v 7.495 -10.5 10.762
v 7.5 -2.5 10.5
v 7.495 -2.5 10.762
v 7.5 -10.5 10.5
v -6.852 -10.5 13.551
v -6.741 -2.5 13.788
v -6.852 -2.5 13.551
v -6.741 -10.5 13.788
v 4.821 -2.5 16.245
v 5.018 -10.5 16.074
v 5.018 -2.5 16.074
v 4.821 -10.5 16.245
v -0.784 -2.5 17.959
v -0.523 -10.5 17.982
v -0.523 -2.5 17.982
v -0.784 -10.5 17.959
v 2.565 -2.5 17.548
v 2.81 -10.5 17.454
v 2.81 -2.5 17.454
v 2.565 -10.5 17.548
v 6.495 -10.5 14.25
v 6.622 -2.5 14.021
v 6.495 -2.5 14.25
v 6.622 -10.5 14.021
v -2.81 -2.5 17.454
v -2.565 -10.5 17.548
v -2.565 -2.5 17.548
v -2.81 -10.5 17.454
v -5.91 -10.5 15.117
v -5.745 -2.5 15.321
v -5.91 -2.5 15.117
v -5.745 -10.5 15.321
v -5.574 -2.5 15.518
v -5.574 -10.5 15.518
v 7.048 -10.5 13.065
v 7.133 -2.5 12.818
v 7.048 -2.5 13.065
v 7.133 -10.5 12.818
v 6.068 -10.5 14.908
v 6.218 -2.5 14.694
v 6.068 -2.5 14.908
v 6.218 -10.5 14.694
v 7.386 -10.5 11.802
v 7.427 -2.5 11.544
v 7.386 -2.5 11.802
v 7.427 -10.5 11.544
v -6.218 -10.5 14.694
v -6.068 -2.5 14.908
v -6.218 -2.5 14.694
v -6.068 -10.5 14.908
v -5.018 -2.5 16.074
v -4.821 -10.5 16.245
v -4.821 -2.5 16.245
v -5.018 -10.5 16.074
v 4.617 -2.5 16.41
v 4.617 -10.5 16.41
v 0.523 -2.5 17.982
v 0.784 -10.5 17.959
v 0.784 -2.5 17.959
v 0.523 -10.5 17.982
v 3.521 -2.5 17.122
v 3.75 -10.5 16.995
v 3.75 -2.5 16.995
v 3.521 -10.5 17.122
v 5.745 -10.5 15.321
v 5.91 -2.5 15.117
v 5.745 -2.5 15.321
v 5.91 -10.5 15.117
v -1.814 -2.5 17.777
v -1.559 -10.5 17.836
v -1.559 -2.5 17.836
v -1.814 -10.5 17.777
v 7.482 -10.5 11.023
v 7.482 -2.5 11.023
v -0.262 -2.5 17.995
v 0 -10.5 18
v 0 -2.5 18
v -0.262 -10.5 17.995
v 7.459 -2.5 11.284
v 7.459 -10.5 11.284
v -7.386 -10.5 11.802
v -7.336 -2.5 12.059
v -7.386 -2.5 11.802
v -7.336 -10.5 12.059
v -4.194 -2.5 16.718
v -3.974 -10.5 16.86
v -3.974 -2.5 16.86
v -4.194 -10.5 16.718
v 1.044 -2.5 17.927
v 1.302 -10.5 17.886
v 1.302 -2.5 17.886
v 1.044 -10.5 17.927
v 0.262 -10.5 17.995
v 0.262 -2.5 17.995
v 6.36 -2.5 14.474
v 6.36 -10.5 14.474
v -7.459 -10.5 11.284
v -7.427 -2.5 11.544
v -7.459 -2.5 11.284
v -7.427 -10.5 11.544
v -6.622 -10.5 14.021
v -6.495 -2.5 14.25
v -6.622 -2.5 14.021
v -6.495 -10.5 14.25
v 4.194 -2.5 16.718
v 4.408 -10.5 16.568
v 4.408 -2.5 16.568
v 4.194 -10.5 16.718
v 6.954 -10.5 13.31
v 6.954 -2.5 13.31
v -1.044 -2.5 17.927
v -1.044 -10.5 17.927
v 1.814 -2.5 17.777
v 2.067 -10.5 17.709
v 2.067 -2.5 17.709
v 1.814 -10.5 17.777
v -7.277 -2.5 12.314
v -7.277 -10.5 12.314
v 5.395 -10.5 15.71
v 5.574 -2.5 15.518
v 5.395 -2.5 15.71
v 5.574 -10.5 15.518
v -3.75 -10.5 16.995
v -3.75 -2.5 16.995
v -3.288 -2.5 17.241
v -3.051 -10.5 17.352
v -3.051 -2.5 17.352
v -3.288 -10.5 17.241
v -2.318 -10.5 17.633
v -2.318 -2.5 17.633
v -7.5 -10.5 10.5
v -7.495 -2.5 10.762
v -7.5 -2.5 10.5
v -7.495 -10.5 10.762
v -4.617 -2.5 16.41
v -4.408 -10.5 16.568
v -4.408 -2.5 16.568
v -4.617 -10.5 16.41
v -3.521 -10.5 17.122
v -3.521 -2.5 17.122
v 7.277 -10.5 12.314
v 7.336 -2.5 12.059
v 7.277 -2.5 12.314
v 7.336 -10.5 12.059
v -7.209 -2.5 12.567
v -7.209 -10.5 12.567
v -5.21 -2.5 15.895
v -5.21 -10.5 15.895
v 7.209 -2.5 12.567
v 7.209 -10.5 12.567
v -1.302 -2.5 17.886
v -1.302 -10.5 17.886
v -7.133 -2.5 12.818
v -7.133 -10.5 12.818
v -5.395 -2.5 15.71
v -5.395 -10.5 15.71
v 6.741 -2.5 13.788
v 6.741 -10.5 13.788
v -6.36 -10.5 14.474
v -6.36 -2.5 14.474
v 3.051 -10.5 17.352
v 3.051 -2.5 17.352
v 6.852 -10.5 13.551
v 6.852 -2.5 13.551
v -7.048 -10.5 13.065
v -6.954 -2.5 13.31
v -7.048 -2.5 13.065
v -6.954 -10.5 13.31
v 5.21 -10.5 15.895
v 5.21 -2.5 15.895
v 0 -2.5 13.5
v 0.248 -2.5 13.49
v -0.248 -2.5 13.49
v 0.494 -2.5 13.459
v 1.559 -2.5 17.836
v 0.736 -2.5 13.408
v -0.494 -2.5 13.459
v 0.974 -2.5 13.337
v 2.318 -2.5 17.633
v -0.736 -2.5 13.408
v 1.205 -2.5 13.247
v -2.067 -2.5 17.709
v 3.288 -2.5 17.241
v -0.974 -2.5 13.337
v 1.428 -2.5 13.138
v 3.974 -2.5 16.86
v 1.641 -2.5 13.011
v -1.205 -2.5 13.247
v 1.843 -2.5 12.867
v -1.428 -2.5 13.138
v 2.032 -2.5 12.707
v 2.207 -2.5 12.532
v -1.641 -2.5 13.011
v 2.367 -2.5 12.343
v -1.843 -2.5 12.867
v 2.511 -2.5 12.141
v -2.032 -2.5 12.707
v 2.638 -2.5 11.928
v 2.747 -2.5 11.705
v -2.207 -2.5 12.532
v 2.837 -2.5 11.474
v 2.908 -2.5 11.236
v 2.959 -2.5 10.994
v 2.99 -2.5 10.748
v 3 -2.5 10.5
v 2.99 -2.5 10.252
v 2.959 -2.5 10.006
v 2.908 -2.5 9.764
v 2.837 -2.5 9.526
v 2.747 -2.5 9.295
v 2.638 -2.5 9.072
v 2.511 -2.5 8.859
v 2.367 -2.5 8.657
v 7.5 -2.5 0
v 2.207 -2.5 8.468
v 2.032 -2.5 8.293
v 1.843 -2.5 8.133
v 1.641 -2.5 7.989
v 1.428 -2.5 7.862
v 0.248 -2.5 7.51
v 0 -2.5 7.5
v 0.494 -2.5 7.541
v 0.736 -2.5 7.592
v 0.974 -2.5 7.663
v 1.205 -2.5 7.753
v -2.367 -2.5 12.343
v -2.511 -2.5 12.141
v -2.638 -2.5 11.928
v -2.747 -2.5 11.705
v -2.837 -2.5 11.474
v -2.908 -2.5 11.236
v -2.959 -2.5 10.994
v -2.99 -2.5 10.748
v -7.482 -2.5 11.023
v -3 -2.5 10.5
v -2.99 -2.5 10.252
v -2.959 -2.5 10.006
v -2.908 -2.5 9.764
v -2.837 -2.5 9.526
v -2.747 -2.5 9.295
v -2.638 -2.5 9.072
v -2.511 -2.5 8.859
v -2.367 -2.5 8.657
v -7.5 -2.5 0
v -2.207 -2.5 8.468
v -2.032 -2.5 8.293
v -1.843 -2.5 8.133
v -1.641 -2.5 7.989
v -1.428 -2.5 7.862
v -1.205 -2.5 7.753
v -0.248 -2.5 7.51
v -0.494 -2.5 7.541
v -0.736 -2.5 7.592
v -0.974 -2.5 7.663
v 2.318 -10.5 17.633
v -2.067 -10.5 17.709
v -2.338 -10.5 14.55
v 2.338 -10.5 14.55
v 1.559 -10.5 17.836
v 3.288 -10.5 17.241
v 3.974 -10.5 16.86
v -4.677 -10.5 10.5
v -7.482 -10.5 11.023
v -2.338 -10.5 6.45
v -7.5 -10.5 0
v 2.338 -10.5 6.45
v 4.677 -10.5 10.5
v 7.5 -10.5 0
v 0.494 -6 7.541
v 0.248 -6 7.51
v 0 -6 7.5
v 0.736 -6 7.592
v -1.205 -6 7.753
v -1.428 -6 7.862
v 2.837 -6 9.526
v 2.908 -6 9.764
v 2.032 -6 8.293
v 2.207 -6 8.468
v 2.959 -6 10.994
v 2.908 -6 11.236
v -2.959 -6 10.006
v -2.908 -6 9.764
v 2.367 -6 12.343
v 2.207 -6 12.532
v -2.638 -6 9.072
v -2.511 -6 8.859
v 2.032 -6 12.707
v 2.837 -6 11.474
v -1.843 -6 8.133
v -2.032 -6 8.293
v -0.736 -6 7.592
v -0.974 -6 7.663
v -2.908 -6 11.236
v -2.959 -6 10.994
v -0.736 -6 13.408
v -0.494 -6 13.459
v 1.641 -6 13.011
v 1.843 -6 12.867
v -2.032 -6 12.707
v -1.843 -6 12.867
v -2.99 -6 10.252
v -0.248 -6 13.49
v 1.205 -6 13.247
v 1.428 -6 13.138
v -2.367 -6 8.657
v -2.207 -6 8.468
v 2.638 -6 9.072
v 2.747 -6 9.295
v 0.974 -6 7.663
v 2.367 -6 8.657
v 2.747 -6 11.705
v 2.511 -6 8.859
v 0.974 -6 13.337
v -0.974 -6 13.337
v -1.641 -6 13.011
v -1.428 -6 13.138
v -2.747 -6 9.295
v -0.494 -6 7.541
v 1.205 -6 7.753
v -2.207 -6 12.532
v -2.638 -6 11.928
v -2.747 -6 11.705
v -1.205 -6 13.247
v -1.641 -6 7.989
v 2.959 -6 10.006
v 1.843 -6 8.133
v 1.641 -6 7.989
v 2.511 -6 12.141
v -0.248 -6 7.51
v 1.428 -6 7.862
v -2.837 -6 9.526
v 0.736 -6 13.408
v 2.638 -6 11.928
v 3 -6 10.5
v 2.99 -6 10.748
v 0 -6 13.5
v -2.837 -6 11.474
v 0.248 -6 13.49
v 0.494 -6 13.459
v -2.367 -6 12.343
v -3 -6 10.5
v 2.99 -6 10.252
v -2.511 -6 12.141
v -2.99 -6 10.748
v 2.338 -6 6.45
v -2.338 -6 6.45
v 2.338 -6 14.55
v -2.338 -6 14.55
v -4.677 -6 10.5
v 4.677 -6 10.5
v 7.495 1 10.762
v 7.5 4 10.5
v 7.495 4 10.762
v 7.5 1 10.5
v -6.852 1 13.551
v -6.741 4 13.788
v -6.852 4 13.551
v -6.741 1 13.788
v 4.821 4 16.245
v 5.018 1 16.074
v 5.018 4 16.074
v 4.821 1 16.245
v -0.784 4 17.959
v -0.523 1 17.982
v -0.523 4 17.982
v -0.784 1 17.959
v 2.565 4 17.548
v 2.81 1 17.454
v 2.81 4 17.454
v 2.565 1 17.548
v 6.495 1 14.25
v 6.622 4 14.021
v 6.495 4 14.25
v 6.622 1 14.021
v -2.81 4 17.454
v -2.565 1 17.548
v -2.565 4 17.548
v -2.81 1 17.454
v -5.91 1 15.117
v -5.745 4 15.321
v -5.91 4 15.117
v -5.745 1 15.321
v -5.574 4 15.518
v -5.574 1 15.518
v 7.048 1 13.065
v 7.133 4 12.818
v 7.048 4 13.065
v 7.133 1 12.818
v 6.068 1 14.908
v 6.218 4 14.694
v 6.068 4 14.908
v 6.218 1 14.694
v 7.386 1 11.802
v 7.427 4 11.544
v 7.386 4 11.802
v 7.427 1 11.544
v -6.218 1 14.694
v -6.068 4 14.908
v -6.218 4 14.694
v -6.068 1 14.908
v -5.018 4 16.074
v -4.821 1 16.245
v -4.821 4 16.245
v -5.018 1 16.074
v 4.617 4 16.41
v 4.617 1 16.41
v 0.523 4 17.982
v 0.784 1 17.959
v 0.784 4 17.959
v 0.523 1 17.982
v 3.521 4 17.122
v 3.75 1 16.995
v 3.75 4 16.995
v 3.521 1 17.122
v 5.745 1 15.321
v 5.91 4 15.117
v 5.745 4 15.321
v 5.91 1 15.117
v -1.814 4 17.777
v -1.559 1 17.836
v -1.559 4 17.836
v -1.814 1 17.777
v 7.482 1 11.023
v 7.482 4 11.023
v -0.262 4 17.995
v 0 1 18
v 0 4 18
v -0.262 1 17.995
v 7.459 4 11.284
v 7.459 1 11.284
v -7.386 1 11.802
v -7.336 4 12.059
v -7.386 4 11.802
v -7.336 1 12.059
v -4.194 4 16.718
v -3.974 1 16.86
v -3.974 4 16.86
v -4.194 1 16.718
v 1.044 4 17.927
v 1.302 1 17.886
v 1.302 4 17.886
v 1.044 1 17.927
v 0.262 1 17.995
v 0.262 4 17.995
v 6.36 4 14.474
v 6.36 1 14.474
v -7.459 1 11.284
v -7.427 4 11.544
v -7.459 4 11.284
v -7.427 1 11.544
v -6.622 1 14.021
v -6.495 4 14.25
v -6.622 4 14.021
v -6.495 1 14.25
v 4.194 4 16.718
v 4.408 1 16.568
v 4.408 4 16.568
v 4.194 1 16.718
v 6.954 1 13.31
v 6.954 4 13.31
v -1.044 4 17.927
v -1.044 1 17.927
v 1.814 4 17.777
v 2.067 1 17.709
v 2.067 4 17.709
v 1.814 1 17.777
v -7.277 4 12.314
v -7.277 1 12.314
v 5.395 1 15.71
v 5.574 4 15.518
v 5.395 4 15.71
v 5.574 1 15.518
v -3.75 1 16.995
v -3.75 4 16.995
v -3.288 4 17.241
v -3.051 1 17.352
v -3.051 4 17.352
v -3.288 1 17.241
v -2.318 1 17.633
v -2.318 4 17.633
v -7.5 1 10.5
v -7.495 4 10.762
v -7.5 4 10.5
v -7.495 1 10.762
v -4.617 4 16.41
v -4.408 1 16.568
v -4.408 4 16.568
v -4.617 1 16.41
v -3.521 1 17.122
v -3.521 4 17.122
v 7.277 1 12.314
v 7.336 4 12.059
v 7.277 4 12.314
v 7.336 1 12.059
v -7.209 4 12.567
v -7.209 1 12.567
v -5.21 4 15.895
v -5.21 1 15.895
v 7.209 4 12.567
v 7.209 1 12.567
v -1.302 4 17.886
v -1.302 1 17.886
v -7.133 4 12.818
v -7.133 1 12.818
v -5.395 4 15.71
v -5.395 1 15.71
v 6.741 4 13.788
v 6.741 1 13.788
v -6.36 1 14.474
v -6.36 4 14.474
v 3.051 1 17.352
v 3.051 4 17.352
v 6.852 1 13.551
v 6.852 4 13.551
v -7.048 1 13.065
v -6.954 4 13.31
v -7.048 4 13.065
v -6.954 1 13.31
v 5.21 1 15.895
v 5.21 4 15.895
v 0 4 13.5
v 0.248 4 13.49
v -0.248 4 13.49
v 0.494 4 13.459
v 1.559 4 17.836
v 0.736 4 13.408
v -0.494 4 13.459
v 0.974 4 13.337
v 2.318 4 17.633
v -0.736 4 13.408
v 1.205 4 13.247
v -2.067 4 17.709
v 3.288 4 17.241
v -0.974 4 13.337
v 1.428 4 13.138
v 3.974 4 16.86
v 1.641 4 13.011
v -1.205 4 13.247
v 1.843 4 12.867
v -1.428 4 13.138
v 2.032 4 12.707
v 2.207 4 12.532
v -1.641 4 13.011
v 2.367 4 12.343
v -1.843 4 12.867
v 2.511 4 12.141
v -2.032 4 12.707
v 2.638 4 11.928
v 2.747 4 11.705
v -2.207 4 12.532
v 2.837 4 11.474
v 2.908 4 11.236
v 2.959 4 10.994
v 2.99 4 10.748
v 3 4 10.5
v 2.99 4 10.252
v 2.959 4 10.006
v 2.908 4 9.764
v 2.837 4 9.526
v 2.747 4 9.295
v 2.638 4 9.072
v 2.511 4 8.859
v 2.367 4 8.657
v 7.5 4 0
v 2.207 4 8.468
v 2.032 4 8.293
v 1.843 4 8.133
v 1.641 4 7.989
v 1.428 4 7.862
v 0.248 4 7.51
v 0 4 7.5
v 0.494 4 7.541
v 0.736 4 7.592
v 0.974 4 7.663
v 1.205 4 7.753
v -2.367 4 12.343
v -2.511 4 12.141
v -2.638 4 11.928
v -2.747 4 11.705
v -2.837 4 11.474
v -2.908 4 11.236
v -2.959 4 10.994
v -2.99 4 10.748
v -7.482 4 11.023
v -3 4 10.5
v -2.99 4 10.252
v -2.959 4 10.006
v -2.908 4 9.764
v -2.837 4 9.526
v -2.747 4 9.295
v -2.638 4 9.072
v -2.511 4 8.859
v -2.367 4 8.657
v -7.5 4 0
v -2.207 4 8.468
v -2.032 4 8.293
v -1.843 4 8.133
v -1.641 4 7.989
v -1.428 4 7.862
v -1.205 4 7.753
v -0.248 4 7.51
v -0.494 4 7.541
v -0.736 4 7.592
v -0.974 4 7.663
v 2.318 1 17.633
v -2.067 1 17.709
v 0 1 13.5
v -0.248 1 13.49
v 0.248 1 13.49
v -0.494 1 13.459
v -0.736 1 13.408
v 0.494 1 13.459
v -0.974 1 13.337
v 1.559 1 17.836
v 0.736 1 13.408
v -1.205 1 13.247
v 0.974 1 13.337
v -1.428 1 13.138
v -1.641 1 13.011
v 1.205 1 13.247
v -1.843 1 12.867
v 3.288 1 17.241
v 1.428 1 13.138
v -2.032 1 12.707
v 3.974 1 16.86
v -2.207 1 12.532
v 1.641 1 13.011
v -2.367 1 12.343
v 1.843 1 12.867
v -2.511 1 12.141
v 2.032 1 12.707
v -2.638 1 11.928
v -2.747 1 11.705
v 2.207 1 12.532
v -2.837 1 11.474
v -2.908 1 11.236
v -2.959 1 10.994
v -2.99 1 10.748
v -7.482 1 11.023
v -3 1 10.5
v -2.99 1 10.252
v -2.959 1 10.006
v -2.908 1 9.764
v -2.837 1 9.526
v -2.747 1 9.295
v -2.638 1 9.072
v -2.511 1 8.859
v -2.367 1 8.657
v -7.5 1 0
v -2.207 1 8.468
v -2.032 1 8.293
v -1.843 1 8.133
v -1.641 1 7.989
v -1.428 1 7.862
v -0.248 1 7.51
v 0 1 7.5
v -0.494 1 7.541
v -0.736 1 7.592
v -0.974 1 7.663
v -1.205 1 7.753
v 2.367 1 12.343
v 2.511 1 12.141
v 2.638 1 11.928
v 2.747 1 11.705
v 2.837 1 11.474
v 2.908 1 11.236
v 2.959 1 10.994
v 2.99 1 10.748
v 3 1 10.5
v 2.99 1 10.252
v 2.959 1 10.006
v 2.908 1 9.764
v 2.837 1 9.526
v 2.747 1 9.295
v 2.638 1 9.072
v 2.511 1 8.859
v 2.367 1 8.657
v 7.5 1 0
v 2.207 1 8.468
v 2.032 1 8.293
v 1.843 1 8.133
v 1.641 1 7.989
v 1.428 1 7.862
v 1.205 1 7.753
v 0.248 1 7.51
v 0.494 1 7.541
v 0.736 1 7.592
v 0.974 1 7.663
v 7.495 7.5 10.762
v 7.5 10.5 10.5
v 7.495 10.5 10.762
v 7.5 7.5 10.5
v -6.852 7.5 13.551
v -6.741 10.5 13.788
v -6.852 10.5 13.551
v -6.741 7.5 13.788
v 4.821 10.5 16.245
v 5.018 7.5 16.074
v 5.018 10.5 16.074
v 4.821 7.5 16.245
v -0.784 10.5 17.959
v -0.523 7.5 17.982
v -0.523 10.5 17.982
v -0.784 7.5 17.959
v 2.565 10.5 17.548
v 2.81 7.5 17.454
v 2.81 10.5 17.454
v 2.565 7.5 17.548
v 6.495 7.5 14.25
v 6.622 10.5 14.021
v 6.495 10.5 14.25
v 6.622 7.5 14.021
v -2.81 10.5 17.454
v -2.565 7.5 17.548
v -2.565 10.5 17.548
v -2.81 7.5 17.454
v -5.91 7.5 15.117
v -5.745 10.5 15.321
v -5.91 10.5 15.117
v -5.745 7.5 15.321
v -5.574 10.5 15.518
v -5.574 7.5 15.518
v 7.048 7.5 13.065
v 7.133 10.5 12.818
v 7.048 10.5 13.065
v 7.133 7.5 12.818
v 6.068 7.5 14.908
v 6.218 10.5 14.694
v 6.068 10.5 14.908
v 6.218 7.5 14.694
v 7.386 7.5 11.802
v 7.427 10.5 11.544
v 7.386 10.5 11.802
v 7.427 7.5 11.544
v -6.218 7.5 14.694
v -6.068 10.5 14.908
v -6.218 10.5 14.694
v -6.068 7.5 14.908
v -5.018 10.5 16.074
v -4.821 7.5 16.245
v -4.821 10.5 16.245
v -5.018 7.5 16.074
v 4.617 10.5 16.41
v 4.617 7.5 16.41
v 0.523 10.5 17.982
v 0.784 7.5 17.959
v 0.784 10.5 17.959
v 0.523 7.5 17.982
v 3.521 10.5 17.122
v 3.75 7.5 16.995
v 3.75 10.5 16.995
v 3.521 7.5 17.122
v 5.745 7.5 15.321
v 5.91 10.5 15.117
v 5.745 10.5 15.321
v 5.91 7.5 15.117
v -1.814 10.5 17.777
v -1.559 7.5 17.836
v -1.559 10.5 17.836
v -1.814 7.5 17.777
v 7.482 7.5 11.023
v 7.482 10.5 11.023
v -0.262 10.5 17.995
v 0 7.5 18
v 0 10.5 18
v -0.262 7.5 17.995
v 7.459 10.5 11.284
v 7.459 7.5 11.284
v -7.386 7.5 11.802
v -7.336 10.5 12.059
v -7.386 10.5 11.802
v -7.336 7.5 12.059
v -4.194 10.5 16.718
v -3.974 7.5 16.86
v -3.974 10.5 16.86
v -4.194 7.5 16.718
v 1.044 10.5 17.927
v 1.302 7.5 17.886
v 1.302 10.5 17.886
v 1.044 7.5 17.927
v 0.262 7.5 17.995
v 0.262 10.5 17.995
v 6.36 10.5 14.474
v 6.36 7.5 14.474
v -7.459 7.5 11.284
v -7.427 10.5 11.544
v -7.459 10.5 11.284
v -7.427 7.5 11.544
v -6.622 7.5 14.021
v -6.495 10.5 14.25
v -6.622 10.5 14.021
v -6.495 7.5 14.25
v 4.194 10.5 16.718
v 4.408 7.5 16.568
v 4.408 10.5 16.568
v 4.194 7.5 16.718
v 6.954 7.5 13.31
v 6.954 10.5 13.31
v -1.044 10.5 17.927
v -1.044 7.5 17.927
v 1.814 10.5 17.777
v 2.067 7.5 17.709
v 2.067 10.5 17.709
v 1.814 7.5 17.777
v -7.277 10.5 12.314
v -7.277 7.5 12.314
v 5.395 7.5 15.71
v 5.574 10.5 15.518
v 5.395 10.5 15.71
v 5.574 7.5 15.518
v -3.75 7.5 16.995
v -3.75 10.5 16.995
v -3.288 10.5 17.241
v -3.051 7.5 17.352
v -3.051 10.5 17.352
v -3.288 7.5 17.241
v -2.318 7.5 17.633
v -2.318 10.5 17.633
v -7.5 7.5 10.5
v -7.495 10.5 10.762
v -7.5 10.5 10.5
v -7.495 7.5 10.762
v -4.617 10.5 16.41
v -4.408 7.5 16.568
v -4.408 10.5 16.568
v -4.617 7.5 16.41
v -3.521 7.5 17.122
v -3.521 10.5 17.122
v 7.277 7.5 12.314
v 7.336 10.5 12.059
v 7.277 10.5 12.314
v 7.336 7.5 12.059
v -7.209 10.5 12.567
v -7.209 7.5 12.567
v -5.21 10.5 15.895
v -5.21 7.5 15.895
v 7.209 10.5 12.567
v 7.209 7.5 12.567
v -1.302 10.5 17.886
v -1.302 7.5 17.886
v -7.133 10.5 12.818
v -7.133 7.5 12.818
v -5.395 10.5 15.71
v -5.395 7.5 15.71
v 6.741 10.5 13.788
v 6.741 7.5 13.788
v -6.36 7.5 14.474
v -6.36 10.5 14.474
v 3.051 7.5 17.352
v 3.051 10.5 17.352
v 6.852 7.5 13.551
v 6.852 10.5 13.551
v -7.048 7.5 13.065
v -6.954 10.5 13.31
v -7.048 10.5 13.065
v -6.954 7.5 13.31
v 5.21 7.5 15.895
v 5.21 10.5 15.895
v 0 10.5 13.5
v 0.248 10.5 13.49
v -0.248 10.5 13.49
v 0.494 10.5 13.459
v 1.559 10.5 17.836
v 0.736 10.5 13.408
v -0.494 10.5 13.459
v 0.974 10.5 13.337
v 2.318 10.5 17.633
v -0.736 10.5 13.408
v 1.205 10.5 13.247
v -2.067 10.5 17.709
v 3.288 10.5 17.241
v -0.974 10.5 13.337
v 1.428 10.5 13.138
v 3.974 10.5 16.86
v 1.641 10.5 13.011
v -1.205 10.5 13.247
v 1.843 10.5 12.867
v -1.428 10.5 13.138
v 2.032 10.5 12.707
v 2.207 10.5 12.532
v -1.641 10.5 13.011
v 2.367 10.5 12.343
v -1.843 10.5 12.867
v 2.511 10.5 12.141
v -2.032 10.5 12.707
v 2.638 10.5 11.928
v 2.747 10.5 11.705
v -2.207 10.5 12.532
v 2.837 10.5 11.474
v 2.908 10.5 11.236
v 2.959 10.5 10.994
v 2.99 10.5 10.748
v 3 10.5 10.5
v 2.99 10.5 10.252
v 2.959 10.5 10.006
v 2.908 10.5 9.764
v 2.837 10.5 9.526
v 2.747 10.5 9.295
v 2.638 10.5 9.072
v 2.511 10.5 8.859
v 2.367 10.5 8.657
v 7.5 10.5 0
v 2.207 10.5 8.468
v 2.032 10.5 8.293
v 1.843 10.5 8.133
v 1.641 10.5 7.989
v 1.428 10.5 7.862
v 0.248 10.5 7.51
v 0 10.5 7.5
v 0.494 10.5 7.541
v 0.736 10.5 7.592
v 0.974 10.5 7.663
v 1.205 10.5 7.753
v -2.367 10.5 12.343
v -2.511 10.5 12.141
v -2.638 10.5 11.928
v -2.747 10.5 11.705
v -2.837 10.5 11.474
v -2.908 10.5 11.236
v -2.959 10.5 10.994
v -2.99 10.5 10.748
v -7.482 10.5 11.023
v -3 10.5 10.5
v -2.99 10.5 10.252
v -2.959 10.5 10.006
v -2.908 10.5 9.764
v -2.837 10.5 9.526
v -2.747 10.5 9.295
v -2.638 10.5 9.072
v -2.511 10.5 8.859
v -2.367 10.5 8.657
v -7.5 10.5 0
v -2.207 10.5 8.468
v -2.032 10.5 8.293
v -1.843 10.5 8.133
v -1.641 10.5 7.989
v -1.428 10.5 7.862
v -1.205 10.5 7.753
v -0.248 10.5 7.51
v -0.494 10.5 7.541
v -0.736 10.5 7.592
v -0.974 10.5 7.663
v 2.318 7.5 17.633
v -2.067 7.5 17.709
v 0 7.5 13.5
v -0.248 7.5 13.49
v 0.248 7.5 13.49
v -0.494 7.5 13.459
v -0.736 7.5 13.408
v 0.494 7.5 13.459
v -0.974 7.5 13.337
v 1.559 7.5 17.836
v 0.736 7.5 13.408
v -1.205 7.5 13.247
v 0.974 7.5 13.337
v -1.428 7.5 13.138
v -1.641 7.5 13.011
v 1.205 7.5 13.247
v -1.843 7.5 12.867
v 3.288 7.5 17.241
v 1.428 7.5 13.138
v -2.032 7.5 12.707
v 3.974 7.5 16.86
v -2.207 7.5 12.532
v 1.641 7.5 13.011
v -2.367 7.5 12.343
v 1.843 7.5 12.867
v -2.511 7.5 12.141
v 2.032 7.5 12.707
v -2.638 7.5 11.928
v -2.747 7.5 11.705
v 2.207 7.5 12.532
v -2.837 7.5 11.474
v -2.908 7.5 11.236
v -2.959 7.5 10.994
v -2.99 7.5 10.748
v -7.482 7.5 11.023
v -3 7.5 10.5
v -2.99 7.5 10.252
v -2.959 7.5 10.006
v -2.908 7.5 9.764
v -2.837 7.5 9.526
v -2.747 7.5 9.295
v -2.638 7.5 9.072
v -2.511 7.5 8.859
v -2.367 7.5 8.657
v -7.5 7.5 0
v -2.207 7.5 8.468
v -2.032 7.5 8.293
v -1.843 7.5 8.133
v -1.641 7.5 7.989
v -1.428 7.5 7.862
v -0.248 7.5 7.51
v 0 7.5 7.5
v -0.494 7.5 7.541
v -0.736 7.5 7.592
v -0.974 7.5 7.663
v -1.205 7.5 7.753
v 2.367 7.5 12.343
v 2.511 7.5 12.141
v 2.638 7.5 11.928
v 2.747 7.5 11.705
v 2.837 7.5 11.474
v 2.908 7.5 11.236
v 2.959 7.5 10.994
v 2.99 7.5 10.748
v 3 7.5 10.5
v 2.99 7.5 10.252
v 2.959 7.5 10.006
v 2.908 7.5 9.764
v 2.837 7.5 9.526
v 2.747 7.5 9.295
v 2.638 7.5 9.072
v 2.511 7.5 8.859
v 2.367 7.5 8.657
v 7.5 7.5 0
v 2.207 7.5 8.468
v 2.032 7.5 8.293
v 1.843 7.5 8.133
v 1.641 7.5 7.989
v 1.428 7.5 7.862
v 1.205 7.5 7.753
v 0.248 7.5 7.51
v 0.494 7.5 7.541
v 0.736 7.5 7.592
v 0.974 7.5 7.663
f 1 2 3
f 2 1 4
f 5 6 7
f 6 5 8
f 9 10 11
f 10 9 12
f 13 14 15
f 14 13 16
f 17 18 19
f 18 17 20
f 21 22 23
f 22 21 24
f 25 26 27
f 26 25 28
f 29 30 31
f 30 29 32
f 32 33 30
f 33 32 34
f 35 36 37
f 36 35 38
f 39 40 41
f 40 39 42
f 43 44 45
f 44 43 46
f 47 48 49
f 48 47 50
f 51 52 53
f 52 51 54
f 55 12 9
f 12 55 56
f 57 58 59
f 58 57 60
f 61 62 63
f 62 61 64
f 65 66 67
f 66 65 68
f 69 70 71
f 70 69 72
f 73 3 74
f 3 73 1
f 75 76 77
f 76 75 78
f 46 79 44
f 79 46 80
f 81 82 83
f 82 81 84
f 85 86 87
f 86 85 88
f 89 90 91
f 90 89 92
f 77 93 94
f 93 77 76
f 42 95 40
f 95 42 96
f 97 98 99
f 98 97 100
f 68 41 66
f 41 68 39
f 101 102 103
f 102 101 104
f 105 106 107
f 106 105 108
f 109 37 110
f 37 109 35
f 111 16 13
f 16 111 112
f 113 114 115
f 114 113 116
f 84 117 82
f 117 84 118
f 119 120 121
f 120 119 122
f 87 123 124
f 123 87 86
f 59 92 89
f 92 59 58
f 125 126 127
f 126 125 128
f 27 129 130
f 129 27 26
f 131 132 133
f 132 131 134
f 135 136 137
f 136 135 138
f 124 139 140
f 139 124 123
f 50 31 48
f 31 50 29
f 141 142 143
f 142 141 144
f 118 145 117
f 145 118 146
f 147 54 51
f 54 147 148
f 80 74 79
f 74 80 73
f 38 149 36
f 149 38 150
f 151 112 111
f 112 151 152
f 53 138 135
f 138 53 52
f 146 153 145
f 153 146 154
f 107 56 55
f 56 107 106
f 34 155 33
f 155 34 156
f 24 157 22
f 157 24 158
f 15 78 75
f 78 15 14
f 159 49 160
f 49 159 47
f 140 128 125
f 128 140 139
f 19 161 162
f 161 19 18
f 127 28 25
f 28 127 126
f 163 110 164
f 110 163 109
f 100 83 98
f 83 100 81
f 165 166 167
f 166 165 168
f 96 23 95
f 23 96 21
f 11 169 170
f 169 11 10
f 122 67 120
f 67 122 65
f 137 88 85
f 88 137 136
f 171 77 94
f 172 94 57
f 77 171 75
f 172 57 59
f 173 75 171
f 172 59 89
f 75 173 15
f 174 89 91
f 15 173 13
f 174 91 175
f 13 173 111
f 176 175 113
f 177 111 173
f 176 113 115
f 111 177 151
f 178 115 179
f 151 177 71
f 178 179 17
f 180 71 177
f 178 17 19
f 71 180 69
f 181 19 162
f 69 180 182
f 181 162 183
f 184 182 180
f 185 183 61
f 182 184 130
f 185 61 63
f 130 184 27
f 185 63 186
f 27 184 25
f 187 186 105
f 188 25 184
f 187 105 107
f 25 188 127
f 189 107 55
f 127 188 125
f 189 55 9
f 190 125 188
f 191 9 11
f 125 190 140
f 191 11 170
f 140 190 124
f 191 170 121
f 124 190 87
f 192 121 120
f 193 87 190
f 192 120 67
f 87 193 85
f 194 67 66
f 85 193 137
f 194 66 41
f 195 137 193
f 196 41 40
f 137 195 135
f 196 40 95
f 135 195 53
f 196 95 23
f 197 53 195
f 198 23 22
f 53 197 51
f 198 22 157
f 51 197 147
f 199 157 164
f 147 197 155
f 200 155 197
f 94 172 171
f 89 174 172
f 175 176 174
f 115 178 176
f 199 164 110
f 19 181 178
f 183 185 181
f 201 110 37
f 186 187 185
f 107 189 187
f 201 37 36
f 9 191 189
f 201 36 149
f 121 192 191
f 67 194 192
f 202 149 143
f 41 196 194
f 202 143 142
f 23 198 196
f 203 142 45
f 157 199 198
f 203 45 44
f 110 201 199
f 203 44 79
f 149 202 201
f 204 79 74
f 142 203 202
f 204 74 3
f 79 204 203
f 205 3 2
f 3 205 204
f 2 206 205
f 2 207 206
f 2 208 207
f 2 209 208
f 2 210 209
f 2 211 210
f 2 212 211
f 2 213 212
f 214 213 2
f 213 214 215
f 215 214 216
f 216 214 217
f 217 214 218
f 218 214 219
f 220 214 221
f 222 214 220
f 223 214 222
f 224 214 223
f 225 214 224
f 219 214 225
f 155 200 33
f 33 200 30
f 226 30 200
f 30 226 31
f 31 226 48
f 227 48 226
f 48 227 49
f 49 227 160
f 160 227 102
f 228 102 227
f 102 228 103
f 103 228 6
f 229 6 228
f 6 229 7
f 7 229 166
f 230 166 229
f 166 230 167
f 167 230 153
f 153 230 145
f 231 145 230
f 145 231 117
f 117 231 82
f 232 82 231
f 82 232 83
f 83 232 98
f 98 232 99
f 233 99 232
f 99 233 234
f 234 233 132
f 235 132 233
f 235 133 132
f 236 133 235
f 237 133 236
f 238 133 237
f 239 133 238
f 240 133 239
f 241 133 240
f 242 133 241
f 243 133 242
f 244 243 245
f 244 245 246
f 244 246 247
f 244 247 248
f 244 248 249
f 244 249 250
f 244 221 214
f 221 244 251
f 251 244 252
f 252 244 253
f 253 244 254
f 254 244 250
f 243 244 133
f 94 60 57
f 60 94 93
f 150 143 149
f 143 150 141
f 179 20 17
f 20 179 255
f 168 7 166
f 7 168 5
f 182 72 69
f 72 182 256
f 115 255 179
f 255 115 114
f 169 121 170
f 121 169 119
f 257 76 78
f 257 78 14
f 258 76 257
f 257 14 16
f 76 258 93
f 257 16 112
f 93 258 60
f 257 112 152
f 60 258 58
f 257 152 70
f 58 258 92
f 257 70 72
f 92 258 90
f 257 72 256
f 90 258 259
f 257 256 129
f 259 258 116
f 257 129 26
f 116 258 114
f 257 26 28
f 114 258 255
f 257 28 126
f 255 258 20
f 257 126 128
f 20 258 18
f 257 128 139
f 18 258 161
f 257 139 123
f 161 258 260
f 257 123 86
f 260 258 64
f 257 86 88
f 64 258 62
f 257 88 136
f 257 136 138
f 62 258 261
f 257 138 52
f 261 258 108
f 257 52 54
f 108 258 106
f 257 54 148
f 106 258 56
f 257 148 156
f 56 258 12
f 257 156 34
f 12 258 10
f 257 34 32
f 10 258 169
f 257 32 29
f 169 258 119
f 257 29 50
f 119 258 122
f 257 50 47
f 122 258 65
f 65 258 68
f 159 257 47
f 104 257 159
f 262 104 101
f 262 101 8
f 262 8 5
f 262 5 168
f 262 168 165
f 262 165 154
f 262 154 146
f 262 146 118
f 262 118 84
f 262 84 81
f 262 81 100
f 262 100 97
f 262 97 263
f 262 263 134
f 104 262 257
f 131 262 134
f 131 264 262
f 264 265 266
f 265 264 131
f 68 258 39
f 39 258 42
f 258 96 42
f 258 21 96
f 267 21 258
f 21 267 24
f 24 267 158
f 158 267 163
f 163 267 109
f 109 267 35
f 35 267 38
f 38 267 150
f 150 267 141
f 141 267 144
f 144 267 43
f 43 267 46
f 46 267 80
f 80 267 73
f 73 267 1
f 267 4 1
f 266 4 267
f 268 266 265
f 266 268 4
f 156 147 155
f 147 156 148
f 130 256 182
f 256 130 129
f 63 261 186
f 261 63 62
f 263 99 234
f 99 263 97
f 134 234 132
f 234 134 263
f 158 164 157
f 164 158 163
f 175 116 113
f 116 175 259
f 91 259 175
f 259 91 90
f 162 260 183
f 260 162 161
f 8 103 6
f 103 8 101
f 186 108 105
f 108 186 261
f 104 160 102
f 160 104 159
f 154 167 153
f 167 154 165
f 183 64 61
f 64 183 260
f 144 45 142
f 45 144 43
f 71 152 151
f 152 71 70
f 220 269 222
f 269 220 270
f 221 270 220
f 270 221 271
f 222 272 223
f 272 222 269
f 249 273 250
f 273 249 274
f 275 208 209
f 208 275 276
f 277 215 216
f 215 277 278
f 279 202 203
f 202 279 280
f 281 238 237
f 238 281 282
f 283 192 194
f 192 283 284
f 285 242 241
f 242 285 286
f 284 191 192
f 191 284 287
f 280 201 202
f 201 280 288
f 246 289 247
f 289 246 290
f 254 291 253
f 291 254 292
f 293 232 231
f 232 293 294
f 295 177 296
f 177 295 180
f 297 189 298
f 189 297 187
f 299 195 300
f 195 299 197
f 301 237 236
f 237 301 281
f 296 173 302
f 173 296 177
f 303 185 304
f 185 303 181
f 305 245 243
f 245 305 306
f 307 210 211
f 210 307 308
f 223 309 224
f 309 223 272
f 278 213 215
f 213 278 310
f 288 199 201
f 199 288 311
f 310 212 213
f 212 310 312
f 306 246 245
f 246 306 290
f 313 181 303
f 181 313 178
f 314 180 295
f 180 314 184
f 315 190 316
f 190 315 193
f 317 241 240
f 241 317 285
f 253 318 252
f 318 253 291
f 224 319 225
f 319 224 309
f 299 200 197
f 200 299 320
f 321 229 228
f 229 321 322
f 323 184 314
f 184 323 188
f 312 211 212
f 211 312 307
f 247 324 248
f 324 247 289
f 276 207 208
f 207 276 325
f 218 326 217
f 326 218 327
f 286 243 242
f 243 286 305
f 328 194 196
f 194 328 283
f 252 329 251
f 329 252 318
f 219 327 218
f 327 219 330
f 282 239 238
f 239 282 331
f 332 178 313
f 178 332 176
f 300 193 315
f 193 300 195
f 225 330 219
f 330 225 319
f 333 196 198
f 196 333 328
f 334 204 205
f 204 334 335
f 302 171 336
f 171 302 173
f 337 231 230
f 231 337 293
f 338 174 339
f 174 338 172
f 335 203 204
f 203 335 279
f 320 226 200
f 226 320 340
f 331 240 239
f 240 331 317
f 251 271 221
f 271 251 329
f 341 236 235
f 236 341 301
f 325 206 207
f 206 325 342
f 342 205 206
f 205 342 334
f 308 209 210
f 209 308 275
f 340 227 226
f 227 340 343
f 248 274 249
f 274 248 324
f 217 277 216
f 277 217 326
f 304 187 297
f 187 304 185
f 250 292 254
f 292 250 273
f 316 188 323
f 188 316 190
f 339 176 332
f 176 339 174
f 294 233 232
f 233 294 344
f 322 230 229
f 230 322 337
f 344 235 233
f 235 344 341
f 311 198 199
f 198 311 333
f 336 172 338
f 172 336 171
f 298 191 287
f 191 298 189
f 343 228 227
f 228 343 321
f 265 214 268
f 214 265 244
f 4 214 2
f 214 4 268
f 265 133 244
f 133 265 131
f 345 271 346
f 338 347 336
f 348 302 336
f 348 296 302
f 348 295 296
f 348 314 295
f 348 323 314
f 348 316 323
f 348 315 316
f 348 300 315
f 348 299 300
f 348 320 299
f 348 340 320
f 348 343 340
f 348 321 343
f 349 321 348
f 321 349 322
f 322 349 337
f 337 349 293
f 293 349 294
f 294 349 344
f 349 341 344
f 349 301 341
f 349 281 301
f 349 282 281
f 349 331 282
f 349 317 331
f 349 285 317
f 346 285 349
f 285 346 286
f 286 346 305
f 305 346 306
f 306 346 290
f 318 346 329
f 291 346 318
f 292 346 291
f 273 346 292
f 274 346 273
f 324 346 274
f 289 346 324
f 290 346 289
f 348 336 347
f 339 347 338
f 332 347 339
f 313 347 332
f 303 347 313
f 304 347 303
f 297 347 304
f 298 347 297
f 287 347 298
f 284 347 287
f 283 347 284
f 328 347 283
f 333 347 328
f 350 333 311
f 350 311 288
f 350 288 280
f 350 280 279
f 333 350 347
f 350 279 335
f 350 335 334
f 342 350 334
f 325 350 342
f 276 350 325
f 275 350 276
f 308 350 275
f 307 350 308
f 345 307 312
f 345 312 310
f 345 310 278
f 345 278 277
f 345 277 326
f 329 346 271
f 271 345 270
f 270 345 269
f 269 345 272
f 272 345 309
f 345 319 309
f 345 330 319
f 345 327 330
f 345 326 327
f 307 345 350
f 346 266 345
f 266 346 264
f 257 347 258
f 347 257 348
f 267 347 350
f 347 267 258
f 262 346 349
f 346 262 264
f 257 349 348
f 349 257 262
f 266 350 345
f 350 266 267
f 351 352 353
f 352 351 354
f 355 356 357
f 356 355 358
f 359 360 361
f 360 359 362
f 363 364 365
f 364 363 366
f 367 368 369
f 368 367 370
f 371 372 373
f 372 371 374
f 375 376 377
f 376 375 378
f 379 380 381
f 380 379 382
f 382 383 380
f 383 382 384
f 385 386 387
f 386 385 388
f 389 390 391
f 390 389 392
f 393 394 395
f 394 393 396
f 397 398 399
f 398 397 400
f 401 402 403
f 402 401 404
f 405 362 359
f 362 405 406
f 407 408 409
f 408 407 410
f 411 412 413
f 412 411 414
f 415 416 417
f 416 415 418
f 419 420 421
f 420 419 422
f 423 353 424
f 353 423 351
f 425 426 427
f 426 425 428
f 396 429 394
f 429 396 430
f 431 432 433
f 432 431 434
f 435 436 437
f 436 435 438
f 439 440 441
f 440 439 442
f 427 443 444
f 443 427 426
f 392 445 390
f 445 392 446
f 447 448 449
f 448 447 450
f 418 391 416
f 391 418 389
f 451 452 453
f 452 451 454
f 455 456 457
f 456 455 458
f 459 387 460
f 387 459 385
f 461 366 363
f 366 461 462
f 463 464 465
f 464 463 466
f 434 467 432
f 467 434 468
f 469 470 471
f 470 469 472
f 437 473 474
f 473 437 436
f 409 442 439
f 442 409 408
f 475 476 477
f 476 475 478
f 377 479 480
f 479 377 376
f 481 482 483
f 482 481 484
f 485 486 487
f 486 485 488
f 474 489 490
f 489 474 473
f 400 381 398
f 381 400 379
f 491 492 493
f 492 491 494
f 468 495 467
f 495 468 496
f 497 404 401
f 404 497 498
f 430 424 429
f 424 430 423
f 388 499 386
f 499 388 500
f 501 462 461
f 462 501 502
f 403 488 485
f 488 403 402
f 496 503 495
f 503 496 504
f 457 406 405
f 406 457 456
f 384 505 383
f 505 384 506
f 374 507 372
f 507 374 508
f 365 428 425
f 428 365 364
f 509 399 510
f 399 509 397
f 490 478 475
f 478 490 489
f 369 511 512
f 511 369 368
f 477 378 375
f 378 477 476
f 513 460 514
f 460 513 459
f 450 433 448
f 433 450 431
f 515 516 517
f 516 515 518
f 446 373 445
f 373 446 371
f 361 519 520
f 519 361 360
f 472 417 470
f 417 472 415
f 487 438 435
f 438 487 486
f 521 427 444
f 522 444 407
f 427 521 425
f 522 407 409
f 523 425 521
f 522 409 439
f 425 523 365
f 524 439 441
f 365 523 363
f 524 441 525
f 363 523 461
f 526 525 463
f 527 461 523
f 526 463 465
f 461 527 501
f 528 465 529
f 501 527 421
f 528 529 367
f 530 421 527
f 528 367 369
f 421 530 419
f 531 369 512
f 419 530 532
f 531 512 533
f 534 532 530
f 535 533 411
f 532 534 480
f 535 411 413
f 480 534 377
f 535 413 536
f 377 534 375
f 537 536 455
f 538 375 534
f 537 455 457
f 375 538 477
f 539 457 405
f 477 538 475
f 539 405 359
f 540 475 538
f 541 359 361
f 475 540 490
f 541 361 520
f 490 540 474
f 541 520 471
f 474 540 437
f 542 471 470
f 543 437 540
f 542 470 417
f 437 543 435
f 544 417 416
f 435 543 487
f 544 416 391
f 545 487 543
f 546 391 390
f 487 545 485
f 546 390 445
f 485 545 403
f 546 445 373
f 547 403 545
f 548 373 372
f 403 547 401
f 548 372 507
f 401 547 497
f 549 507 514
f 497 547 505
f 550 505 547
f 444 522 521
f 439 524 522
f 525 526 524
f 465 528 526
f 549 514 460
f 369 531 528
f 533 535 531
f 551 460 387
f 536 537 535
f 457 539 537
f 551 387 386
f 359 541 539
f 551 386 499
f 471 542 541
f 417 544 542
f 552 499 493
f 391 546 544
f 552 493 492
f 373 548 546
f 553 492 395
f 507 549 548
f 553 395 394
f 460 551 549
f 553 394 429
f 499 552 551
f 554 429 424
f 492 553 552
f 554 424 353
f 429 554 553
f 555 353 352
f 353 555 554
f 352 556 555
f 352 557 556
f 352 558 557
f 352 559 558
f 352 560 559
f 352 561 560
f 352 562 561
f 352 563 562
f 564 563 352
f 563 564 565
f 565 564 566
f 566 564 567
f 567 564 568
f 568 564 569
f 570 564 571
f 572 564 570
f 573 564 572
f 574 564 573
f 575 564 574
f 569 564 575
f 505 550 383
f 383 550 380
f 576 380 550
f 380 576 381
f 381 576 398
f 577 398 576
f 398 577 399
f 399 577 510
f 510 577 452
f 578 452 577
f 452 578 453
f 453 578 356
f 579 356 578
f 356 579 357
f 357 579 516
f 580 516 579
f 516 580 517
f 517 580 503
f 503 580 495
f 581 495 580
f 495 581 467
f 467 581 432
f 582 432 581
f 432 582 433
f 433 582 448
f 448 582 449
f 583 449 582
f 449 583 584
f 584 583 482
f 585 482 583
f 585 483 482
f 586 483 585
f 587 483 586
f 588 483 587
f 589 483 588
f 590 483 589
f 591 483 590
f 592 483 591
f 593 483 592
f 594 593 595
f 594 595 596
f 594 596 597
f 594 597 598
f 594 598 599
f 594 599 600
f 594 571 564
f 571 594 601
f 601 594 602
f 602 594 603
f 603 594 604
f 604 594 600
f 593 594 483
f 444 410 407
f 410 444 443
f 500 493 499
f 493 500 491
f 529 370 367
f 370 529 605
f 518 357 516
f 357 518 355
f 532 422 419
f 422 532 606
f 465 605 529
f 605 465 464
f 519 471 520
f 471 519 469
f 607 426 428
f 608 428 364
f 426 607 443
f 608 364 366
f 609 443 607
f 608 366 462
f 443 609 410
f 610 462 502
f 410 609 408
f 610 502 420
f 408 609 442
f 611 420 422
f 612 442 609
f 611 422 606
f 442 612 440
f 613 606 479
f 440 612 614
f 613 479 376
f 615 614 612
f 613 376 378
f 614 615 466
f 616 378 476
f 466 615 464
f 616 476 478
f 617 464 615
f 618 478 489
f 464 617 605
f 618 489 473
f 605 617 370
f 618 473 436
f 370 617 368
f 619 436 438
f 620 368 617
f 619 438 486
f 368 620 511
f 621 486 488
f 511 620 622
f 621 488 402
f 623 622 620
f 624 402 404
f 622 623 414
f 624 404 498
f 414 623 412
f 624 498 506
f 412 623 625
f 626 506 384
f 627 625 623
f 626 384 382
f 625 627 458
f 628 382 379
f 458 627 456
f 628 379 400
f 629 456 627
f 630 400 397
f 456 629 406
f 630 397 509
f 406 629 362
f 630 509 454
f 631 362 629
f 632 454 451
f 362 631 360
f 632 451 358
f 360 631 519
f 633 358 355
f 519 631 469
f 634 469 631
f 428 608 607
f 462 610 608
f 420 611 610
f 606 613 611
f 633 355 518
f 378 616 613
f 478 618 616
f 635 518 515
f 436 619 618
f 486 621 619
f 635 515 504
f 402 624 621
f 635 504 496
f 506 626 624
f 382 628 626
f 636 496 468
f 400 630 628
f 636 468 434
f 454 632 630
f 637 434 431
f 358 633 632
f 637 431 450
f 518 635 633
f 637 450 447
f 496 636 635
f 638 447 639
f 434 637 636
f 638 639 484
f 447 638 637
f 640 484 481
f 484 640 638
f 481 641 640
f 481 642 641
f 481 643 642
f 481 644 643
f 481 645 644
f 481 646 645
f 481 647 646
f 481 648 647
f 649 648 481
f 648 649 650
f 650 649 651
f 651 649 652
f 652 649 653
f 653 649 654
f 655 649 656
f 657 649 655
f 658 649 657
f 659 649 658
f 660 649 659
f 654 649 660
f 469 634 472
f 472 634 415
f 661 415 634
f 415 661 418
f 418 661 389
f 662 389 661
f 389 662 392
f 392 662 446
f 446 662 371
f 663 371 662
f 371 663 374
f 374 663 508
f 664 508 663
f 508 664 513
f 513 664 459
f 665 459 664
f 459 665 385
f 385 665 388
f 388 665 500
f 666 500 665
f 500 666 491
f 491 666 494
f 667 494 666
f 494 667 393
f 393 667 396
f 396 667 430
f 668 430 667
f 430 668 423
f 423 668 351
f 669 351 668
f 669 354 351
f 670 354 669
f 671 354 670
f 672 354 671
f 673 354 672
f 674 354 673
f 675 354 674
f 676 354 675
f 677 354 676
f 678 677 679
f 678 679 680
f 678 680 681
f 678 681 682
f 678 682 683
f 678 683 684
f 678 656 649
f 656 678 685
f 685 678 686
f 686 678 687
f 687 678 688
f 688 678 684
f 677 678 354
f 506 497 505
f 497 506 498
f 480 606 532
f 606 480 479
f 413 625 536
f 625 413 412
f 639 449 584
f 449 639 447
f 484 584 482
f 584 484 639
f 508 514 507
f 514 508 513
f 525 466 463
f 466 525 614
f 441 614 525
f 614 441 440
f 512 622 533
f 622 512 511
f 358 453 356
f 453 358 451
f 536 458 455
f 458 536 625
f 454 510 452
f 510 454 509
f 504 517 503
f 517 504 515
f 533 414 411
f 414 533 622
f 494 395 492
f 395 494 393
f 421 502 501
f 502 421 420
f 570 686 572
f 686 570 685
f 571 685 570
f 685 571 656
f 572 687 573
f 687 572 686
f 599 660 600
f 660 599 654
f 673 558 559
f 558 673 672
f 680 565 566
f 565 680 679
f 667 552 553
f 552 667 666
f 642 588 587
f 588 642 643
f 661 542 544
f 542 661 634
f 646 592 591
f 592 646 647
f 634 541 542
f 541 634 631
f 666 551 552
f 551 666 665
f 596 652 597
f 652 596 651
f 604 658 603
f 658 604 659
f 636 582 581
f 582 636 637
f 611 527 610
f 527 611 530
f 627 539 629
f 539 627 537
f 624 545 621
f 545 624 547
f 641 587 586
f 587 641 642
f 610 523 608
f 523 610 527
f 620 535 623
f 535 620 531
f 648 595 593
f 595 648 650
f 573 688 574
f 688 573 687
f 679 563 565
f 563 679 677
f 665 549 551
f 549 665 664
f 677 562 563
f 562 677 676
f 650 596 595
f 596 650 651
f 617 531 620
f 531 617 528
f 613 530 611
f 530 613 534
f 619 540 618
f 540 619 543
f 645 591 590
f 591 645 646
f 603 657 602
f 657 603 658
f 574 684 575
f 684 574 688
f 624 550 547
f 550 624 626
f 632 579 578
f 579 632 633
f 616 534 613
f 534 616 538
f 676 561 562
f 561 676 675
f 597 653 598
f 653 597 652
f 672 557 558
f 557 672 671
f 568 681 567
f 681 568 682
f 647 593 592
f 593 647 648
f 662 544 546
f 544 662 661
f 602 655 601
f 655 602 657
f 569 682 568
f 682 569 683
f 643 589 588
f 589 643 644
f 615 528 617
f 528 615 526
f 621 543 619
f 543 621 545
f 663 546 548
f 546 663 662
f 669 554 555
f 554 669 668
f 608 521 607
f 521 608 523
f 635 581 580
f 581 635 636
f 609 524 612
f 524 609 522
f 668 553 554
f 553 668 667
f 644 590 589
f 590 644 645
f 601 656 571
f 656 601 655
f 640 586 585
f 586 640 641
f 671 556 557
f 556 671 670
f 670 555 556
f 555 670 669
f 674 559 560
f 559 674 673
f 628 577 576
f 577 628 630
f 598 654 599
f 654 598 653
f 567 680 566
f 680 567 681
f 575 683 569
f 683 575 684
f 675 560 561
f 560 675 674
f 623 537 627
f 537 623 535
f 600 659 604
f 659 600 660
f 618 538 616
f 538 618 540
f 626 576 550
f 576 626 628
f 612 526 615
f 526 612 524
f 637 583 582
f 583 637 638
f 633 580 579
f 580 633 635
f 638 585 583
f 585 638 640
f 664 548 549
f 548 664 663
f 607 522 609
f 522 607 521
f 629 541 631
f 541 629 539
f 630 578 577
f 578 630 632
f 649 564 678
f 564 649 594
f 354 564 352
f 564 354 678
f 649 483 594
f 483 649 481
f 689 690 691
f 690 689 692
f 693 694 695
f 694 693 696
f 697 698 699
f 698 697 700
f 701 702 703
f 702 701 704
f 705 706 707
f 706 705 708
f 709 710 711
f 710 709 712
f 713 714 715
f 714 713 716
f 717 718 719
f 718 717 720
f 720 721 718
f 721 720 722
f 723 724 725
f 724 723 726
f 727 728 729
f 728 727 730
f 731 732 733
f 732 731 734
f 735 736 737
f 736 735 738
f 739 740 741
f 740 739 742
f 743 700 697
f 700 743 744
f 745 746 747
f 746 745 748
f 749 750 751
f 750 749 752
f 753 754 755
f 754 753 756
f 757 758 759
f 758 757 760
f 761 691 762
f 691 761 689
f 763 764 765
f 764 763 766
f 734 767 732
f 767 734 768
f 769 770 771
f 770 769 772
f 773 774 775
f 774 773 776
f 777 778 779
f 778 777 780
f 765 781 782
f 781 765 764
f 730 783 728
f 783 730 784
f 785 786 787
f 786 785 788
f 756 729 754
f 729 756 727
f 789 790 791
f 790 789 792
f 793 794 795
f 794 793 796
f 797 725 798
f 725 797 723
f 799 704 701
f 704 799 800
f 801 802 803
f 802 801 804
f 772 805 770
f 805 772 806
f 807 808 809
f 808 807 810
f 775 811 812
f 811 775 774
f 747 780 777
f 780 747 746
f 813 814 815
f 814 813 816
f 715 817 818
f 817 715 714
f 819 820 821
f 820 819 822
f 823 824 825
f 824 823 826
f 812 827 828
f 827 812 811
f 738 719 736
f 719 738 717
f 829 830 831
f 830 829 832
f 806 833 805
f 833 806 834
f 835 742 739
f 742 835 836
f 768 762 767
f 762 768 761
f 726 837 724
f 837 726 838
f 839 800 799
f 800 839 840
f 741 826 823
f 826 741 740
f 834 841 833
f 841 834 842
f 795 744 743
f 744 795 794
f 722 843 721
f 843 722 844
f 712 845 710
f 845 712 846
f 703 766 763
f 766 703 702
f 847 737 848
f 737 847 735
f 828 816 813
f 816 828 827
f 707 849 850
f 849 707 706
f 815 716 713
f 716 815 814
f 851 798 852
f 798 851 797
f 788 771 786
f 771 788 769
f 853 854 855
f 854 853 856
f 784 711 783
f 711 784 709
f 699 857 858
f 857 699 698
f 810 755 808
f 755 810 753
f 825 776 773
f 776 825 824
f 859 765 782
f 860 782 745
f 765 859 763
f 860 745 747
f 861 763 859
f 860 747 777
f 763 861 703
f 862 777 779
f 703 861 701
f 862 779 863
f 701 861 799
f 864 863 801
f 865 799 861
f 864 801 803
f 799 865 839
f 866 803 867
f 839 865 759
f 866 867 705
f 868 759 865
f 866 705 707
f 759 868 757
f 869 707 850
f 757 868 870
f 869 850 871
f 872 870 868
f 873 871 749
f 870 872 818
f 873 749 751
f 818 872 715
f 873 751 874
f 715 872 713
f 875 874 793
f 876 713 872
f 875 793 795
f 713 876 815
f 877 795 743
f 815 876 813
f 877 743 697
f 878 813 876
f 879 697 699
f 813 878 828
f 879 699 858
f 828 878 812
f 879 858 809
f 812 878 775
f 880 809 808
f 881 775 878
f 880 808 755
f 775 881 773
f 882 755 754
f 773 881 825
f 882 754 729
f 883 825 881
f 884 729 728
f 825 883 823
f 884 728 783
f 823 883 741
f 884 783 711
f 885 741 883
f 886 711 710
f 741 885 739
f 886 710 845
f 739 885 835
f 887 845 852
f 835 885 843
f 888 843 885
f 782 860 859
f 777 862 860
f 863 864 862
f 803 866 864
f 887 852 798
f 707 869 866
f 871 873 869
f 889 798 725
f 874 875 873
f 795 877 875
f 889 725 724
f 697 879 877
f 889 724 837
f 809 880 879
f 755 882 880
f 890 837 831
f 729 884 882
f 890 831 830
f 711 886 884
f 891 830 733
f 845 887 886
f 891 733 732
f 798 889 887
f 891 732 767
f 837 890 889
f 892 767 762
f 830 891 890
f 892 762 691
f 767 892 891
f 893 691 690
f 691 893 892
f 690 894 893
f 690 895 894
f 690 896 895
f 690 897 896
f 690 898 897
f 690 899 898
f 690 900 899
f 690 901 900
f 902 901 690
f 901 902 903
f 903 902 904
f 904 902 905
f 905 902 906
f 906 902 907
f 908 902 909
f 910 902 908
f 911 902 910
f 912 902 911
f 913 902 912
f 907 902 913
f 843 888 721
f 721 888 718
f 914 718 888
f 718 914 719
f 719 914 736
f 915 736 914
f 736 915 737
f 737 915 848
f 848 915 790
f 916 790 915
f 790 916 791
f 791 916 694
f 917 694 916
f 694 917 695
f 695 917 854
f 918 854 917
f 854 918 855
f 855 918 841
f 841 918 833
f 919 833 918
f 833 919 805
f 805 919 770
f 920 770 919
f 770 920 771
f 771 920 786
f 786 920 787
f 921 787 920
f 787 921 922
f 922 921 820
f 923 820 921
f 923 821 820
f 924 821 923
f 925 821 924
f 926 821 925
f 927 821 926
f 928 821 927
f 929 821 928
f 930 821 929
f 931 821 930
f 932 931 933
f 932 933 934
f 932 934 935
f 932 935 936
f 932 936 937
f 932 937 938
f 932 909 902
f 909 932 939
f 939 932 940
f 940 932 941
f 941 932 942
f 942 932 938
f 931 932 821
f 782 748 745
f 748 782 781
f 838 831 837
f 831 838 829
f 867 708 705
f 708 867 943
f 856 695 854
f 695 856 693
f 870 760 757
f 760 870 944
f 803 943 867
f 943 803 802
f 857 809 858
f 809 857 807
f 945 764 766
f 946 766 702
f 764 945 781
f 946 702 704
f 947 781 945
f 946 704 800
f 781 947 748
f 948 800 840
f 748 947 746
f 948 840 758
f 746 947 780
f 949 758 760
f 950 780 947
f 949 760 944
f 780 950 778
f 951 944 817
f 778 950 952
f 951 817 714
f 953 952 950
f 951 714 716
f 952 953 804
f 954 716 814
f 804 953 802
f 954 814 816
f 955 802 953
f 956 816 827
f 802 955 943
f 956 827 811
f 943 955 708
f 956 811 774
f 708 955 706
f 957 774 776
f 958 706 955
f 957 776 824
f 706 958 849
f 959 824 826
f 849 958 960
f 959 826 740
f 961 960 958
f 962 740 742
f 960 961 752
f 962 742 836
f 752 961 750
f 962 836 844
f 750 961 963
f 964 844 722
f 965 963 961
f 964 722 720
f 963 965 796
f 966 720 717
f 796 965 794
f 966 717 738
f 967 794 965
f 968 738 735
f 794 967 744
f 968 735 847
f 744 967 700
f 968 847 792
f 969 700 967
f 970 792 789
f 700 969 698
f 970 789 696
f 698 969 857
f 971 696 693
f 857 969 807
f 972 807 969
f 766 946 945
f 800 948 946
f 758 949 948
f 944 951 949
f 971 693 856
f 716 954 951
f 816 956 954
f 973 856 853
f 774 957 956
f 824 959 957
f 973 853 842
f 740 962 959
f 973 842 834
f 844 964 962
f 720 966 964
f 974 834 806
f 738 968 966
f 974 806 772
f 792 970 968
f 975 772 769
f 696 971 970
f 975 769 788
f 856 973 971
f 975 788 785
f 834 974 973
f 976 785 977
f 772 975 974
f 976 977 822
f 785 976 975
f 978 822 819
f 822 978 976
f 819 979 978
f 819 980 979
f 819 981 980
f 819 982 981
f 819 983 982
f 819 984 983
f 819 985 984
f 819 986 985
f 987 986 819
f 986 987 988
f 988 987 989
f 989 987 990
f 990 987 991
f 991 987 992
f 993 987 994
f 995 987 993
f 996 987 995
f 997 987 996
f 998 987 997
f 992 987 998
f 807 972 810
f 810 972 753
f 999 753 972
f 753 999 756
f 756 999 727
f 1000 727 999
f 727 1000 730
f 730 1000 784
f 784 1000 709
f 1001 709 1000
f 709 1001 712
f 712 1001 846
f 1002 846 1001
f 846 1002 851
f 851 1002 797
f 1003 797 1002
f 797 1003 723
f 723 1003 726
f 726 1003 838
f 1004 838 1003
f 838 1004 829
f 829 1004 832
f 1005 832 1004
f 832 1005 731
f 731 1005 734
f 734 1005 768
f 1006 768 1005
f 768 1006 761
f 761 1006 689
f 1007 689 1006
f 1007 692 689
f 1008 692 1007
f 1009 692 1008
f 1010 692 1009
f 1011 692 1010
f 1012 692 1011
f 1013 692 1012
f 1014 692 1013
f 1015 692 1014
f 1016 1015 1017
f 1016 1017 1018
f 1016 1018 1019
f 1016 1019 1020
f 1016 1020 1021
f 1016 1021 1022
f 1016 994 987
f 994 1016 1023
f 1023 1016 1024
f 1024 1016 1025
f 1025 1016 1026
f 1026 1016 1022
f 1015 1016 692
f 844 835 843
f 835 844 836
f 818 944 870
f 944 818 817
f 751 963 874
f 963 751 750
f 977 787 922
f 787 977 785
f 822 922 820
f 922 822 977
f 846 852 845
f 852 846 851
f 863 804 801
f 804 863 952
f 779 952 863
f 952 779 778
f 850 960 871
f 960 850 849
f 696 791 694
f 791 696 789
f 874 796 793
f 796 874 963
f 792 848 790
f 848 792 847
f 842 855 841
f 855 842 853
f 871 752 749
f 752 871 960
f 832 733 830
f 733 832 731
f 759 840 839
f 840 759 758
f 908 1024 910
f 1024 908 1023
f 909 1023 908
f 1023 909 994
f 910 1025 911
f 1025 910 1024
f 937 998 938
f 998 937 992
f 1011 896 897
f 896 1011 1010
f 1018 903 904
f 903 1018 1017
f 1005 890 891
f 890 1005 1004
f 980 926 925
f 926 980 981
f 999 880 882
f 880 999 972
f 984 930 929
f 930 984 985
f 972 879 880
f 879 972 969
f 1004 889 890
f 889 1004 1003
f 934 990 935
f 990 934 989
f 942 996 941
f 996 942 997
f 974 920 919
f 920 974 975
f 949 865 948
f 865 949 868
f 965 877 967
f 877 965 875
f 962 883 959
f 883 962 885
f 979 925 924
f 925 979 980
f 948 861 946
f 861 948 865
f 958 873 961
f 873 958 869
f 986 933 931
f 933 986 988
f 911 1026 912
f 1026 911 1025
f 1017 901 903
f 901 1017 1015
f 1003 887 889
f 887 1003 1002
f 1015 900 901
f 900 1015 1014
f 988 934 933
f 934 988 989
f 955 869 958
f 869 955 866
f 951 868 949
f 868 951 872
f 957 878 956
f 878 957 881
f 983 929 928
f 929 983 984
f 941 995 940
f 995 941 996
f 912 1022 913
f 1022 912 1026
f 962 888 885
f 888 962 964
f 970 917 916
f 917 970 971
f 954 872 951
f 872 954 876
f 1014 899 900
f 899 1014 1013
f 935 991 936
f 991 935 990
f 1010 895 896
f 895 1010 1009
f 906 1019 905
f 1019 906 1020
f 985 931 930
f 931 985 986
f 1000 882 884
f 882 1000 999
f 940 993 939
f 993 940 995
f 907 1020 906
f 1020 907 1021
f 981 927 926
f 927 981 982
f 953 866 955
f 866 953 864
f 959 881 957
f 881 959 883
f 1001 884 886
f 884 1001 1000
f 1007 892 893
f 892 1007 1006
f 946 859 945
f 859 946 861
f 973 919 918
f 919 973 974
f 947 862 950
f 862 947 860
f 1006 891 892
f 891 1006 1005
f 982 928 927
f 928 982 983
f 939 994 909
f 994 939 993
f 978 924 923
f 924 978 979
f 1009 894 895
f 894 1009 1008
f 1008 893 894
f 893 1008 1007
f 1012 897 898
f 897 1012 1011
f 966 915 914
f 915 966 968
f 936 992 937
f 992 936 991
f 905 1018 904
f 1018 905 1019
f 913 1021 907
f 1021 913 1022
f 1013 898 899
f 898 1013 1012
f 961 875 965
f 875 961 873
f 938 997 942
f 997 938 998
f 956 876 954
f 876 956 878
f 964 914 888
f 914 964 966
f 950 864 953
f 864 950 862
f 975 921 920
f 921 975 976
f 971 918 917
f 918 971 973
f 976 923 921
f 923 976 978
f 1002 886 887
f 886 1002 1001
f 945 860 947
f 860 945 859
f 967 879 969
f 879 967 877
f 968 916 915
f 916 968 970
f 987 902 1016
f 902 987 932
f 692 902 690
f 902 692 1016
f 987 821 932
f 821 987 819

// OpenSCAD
$fa = 2;
$fs = 0.25;
Extra_Mount_Depth = 3;

module nut_hole()
{
	rotate([0, 90, 0]) // (Un)comment to rotate nut hole
	rotate([90, 0, 0])
		for(i = [0:(360 / 3):359])
		{
			rotate([0, 0, i])
				cube([4.6765, 8.1, 5], center = true);
		}
}

module flap(Width)
{
	rotate([90, 0, 0])
	union()
	{
		translate([3.5, (-7.5), 0])
			cube([4 + Extra_Mount_Depth, 15, Width]);


		translate([0, (-7.5), 0])
			cube([7.5 + Extra_Mount_Depth, 4, Width]);

		translate([0, 3.5, 0])
			cube([7.5 + Extra_Mount_Depth, 4, Width]);

		difference()
		{
			cylinder(h = Width, d = 15);

			translate([0, 0, (-1)])
				cylinder(h = Width + 2, d = 6);
		}
	}
}

module mount2()
{
	union()
	{

			translate([0, 4, 0])
		flap(3);

		translate([0, 10.5, 0])
		flap(3);
	}
}

module mount3()
{
	union()
	{
		difference()
		{
			translate([0, (-2.5), 0])
				flap(8);

			translate([0, (-8.5), 0])
				nut_hole();
		}

		mount2();
	}
}

/* GoPro Mount - 2 flap no nut hole
translate([0, 0, 10.5])
	rotate([0, 90, 0])
		mount2();
// */

//* GoPro Mount - 3 flap w/nut hole
translate([0, 0, 10.5])
	rotate([0, 90, 0])
		mount3();
// */
